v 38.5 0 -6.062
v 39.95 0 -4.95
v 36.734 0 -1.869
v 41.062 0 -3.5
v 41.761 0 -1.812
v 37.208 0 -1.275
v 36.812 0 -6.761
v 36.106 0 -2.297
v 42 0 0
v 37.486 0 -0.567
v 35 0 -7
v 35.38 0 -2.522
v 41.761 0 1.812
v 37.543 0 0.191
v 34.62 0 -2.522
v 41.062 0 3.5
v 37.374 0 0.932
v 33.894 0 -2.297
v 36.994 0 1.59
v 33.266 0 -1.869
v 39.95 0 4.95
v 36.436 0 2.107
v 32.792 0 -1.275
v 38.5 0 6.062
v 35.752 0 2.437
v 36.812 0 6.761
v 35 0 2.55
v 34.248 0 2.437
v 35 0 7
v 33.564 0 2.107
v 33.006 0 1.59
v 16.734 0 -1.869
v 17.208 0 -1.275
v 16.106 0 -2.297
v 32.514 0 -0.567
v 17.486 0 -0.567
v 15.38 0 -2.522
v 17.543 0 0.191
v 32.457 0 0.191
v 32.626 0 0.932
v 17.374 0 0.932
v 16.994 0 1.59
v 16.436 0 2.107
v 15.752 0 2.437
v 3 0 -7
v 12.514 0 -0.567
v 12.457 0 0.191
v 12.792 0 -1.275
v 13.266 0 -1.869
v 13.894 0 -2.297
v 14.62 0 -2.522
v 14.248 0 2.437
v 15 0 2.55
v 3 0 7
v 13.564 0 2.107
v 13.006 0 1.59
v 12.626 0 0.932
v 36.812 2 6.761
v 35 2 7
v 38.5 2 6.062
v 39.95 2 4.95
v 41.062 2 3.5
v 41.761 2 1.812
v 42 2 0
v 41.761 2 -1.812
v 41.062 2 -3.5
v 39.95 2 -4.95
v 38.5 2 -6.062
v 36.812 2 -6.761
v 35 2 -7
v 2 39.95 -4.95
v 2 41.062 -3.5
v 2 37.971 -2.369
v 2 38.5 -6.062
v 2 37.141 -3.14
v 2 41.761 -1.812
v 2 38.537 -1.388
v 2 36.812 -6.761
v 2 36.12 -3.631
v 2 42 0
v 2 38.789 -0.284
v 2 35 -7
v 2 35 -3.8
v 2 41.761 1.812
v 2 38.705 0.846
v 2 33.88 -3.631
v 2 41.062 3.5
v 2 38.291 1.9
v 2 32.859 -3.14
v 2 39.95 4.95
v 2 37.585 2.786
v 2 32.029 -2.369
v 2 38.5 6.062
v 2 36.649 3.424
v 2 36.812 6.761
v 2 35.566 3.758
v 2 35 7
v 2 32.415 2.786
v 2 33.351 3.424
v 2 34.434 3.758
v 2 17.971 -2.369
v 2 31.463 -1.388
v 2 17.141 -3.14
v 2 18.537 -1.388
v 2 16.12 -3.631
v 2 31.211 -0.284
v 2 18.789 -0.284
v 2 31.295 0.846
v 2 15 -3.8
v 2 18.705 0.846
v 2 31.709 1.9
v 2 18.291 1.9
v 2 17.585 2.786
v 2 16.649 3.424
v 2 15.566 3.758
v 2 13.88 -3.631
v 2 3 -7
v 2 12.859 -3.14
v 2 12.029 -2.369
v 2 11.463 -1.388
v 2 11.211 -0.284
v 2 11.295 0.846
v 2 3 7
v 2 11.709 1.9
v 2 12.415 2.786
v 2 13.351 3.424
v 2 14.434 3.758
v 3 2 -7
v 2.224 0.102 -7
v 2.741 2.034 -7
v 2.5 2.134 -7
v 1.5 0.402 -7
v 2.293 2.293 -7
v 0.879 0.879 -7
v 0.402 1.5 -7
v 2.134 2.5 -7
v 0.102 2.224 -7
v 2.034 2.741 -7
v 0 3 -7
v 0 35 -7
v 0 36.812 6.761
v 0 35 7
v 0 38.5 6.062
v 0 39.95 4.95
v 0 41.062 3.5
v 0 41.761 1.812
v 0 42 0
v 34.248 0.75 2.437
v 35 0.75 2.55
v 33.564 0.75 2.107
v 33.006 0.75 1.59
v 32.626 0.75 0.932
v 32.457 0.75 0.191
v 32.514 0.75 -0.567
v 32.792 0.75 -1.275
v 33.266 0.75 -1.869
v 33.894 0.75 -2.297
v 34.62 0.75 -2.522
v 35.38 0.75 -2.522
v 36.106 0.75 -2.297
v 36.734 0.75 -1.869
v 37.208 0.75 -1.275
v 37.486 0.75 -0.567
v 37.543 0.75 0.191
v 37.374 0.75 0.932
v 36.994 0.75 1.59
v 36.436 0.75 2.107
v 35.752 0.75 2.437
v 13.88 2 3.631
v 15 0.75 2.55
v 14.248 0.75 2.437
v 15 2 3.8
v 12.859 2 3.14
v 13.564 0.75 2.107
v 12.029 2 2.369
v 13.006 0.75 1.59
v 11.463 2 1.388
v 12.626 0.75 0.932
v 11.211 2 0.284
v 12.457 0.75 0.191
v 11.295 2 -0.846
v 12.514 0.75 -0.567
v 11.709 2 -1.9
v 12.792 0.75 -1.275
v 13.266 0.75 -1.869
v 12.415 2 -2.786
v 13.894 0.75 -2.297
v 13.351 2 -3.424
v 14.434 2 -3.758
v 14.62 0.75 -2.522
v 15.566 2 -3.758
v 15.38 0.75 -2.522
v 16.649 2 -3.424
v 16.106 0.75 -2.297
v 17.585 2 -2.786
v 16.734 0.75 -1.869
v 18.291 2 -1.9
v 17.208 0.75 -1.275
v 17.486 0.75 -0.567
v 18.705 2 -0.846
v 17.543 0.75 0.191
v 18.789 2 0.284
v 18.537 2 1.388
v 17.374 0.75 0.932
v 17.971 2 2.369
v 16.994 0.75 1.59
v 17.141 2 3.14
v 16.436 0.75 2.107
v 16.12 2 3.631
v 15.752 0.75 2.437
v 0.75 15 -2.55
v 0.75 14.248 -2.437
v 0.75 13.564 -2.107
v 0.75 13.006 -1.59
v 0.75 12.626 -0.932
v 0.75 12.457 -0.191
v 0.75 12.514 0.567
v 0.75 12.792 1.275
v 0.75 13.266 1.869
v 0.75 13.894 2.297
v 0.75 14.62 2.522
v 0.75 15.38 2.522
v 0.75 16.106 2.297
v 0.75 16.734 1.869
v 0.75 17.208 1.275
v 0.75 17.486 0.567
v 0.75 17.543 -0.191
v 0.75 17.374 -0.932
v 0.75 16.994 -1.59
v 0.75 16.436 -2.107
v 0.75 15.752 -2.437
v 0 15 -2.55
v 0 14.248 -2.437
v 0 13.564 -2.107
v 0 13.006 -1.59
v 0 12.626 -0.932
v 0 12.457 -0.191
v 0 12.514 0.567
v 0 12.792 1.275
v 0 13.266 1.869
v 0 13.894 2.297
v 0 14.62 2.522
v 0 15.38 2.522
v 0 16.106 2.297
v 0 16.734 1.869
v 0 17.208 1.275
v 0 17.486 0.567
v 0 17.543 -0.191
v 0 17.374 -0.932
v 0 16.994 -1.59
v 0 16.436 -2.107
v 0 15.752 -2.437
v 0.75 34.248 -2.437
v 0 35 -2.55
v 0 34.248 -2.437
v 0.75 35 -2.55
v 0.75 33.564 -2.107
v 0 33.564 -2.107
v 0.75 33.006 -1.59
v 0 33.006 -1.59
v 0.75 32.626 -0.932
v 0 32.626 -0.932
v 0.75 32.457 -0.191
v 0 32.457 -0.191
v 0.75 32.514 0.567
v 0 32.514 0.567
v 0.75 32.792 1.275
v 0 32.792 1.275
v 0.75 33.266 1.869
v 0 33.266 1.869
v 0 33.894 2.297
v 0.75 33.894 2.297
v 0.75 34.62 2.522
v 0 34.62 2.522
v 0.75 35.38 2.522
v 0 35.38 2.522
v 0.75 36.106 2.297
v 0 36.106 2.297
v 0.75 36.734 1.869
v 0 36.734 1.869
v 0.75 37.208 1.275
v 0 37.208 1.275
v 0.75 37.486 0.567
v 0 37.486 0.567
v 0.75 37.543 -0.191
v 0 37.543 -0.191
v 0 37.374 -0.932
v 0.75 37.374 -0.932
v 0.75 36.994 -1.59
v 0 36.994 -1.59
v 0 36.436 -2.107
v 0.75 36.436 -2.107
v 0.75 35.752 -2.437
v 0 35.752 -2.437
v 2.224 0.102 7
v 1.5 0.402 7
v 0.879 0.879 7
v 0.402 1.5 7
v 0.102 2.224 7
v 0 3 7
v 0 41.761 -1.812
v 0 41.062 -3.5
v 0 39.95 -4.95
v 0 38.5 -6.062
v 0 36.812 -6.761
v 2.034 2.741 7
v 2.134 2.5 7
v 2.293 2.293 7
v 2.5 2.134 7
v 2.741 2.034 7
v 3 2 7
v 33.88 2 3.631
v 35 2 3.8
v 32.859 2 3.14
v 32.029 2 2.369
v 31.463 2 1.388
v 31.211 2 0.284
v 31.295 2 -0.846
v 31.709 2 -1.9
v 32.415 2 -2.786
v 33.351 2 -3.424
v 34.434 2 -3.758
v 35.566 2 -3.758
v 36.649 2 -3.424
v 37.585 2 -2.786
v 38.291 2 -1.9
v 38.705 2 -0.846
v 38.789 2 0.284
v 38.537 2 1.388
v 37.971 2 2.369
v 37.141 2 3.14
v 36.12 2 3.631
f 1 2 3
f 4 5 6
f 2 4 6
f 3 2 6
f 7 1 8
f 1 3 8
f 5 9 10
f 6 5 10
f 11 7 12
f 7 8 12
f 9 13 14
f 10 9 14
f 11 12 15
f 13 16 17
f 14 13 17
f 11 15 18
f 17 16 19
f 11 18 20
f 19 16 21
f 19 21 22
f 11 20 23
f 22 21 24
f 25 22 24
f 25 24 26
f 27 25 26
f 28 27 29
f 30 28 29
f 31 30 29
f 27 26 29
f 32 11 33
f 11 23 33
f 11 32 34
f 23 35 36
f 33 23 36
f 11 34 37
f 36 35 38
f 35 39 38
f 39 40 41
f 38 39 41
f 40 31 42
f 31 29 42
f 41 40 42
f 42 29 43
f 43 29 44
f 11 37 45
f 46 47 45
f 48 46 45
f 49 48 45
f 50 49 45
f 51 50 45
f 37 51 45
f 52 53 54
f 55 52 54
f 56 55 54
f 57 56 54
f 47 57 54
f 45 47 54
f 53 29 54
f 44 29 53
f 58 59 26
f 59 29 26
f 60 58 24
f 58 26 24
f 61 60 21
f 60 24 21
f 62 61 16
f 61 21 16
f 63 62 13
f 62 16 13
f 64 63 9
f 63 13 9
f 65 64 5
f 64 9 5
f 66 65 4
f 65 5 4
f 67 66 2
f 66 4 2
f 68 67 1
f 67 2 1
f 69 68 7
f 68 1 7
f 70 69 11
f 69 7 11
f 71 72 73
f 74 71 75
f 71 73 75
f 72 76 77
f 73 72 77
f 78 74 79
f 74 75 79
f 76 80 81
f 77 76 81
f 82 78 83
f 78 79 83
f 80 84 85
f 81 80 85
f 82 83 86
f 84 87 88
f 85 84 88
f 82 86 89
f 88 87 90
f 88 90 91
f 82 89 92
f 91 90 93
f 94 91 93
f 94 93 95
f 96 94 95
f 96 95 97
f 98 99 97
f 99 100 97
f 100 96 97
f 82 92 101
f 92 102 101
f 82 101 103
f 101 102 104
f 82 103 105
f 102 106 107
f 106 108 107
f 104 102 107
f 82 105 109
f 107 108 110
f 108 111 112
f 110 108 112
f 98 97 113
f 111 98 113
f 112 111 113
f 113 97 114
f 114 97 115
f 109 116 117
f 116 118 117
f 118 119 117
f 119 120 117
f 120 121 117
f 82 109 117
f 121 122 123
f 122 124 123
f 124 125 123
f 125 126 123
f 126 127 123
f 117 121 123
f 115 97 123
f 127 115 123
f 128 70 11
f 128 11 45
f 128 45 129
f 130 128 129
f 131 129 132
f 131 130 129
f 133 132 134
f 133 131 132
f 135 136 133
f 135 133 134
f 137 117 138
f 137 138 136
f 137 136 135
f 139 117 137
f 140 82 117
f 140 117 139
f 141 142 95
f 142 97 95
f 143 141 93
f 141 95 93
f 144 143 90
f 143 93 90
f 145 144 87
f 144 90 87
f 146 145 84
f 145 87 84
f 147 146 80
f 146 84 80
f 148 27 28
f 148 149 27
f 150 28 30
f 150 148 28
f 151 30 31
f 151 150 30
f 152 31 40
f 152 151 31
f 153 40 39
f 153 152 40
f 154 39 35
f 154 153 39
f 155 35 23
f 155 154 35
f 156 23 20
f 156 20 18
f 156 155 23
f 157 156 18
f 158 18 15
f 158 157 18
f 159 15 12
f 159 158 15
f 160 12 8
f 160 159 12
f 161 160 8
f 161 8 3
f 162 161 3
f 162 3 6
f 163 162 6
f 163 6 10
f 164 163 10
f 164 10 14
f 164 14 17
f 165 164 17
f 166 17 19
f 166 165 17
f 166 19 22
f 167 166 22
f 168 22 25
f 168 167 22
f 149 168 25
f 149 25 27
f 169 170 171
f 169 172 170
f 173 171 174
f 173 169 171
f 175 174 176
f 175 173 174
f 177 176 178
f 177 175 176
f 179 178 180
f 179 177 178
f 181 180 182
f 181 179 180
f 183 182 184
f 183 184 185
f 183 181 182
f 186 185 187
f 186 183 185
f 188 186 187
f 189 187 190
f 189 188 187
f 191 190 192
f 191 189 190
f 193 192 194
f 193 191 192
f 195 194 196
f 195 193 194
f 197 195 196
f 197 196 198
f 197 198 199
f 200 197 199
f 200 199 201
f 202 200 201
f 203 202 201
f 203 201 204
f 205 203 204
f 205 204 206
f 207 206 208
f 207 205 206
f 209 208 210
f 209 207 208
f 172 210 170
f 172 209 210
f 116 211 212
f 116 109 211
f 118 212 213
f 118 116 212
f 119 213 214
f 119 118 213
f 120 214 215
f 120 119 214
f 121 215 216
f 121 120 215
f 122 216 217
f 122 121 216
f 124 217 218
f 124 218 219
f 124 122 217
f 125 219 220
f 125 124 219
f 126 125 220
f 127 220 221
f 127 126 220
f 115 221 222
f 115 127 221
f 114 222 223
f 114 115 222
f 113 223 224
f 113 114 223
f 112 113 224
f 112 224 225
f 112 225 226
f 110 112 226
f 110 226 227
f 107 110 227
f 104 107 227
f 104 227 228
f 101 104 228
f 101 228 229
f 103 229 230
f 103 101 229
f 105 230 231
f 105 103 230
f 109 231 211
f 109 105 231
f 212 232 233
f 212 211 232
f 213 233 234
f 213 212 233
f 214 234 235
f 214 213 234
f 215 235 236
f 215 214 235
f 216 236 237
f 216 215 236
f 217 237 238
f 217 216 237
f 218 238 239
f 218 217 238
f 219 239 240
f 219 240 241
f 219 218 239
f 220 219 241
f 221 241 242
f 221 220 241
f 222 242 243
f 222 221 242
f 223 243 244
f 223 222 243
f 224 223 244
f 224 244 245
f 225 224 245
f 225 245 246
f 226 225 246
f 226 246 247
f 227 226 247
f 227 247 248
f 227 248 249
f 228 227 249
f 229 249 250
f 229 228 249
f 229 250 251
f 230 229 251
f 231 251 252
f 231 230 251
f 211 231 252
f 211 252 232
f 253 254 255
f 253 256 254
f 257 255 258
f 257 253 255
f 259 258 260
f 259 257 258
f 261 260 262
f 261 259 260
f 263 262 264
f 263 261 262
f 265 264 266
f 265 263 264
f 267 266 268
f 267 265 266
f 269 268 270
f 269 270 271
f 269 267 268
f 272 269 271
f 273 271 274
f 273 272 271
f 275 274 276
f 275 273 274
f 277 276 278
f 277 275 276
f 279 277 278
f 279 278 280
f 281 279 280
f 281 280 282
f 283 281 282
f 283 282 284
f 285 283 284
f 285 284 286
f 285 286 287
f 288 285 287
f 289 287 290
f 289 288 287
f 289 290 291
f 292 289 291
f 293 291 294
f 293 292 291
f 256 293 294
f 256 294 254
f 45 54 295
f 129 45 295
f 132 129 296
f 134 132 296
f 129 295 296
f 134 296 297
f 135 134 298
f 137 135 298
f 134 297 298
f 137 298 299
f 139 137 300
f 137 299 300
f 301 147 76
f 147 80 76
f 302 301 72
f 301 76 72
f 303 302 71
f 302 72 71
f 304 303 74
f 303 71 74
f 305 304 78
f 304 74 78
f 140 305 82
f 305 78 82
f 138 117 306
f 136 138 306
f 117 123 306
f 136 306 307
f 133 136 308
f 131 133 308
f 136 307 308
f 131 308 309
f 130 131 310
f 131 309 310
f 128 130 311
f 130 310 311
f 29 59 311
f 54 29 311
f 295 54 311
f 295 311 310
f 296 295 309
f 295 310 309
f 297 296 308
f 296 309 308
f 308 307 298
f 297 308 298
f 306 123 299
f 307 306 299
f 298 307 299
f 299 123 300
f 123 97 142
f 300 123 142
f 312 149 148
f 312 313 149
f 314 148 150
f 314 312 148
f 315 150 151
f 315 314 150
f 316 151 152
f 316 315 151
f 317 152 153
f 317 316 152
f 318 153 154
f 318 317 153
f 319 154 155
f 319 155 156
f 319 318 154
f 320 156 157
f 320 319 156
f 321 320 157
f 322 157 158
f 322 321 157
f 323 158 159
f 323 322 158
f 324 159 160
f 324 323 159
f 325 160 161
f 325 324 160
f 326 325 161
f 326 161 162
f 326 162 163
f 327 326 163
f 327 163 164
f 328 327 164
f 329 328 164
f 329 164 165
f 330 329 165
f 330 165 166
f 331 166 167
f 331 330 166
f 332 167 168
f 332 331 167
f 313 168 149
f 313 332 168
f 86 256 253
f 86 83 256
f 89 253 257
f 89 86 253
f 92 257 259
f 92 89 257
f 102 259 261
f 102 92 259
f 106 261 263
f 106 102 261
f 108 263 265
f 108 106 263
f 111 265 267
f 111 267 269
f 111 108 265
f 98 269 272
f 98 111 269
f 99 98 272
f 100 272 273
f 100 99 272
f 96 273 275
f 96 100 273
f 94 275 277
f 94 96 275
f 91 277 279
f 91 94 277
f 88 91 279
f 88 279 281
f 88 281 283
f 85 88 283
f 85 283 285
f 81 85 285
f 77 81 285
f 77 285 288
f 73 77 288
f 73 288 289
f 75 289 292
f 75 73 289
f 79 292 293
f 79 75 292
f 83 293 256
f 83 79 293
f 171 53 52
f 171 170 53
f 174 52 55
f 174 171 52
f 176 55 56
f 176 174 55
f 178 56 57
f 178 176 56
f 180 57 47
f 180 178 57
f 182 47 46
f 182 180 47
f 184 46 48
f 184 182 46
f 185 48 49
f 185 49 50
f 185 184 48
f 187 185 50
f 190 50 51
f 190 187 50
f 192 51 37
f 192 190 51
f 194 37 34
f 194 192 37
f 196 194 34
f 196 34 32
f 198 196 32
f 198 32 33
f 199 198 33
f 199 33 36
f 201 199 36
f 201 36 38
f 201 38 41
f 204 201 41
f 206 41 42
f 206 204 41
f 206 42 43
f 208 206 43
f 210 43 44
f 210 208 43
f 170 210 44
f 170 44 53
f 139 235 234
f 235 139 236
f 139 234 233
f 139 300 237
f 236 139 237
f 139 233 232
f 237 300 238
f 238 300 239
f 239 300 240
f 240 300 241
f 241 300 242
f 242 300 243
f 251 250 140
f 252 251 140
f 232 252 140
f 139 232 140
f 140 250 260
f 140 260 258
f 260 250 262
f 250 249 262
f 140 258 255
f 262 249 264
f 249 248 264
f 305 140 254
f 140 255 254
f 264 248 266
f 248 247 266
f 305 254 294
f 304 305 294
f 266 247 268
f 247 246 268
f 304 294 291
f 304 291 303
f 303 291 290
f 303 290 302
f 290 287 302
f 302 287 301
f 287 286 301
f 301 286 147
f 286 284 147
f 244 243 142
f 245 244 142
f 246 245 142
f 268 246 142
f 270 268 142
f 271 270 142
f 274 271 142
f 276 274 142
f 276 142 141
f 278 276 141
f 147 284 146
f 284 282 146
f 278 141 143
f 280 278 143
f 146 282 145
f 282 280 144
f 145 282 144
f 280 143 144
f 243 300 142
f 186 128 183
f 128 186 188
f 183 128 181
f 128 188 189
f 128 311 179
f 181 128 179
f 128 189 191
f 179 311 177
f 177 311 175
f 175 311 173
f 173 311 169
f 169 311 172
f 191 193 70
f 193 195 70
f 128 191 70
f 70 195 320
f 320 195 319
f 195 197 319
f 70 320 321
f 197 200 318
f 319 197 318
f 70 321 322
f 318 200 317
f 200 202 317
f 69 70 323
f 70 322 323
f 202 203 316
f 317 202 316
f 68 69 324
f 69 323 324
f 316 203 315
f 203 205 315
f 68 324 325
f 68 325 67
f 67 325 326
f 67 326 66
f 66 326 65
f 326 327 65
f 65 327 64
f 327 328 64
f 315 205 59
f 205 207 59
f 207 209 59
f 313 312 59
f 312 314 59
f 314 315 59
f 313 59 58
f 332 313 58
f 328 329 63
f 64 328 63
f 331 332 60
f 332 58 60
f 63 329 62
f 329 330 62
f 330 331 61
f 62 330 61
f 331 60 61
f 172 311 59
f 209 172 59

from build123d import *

# Parameters (mm, degrees)
BOSS_EXTRU_1_DEPTH                         = 7
CONG_1_R                                   = 7
FRAISAGE_POUR_VIS_T_TE_FRAIS_E_6_2_COUNT   = 2
FRAISAGE_POUR_VIS_T_TE_FRAIS_E_6_2_PITCH   = 20
FRAISAGE_POUR_VIS_T_TE_FRAIS_E_6_3_A_COUNT = 2
FRAISAGE_POUR_VIS_T_TE_FRAIS_E_6_3_A_PITCH = 20


with BuildPart() as part:
    # Esquisse1 → Boss.-Extru.1 (new, symmetric)
    with BuildSketch(Plane.XY):
        with BuildLine():
            Line((0, 3), (0, 42))
            Line((0, 42), (2, 42))
            Line((2, 42), (2, 3))
            ThreePointArc((2, 3), (2.292893219, 2.292893219), (3, 2))
            Line((3, 2), (42, 2))
            Line((42, 2), (42, 0))
            Line((42, 0), (3, 0))
            ThreePointArc((3, 0), (0.878679656, 0.878679656), (0, 3))
        make_face()
    extrude(amount=BOSS_EXTRU_1_DEPTH, both=True)

    # Congé1
    cong_1_edges = [part.edges().sort_by_distance(p)[0] for p in [
        (1, 42, -7),
        (1, 42, 7),
        (42, 1, -7),
        (42, 1, 7),
    ]]
    fillet(cong_1_edges, radius=CONG_1_R - 0.0001)  # a hair under: the kernel refuses the full size

    # Esquisse2 → Fraisage pour vis _ t_te frais_e _ 6 pan (revolve, cut)
    with BuildSketch(Plane(origin=(35, 2, 0), x_dir=(0, 0, 1), z_dir=(1, 0, 0))):
        Polygon((0, 0), (0, 2), (2.55, 2), (2.55, 1.25), (3.8, 0), align=None)
    fraisage_pour_vis_t_te_frais_e_6_pan = revolve(axis=Axis((35, 8.35, 0), (0, -1, 0)), mode=Mode.SUBTRACT)

    # Fraisage pour vis _ t_te frais_e _ 6 2: Fraisage pour vis _ t_te frais_e _ 6 pan ×2
    with Locations(*[(-i * FRAISAGE_POUR_VIS_T_TE_FRAIS_E_6_2_PITCH, 0, 0) for i in range(1, FRAISAGE_POUR_VIS_T_TE_FRAIS_E_6_2_COUNT)]):
        add(fraisage_pour_vis_t_te_frais_e_6_pan, mode=Mode.SUBTRACT)

    # Esquisse4 → Fraisage pour vis _ t_te frais_e _ 6 3 (revolve, cut)
    with BuildSketch(Plane(origin=(2, 35, 0), x_dir=(0, 0, -1), z_dir=(0, 1, 0))):
        Polygon((0, 0), (0, 2), (2.55, 2), (2.55, 1.25), (3.8, 0), align=None)
    fraisage_pour_vis_t_te_frais_e_6_3 = revolve(axis=Axis((8.35, 35, 0), (-1, 0, 0)), mode=Mode.SUBTRACT)

    # Fraisage pour vis _ t_te frais_e _ 6 3 a: Fraisage pour vis _ t_te frais_e _ 6 3 ×2
    with Locations(*[(0, -i * FRAISAGE_POUR_VIS_T_TE_FRAIS_E_6_3_A_PITCH, 0) for i in range(1, FRAISAGE_POUR_VIS_T_TE_FRAIS_E_6_3_A_COUNT)]):
        add(fraisage_pour_vis_t_te_frais_e_6_3, mode=Mode.SUBTRACT)


solid = part.part
